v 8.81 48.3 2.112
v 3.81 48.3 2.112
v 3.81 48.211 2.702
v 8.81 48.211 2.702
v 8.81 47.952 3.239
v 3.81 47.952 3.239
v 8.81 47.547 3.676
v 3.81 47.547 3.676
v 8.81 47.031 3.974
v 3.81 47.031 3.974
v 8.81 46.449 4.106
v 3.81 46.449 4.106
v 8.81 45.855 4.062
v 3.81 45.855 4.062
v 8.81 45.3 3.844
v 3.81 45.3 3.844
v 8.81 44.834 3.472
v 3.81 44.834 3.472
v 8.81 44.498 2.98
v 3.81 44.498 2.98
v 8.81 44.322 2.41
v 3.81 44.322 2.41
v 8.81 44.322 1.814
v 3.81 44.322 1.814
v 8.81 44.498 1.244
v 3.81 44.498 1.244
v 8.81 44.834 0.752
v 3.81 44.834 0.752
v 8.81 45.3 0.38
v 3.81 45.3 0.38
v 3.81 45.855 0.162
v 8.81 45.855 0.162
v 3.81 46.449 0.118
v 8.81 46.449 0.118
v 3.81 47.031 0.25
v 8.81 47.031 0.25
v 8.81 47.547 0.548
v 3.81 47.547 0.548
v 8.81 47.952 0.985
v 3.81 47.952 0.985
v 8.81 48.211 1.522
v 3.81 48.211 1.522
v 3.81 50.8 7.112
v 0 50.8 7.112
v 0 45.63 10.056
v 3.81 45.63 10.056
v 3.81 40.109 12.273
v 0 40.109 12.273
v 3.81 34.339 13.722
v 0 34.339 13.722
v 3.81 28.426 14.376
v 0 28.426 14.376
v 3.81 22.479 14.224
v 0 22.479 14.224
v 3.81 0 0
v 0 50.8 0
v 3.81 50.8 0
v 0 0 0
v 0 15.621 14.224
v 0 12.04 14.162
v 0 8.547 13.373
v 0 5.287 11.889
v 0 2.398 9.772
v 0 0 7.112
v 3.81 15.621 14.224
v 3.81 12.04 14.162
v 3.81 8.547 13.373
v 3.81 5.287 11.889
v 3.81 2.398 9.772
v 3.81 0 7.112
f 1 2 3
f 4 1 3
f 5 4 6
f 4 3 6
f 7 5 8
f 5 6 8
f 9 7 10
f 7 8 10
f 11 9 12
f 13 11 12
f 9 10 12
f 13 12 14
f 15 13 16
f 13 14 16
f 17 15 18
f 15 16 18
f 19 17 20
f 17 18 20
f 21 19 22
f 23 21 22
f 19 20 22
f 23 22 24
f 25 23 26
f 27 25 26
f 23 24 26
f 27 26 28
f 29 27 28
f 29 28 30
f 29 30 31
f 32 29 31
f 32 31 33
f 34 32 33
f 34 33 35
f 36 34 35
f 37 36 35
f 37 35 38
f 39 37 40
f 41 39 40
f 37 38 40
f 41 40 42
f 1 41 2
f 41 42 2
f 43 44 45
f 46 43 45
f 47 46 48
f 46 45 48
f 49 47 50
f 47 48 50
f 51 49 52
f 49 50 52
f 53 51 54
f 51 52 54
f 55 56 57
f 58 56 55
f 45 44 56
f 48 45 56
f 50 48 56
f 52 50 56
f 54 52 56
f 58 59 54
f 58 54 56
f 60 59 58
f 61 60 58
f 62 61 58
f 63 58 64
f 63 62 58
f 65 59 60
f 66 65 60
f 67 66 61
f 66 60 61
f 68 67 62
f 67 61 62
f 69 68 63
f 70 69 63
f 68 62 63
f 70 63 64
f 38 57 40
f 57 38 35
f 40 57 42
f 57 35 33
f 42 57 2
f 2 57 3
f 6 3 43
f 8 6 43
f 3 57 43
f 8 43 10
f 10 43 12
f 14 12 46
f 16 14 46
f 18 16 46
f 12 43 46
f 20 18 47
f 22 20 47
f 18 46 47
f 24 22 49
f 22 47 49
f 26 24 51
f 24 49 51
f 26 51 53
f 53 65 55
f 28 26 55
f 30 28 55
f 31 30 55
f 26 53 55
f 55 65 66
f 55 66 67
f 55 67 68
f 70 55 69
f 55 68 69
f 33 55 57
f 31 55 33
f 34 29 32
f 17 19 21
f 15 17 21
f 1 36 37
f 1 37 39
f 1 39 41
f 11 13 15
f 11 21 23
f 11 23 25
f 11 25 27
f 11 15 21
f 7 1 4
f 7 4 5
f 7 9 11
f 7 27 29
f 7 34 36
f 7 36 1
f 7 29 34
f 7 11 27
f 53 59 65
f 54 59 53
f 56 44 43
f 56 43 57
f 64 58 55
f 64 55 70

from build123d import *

# Parameters (mm, degrees)
PAD_DEPTH    = 3.81
SKETCH001_R  = 2
PAD001_DEPTH = 5


with BuildPart() as part:
    # Sketch → Pad (new body)
    with BuildSketch(Plane.YZ):
        with BuildLine():
            Line((50.8, 7.112), (50.8, 0))
            Line((50.8, 0), (0, 0))
            Line((0, 0), (0, 7.112))
            ThreePointArc((15.621017, 14.224002), (6.878912, 12.714188), (0, 7.112))
            Line((15.621017, 14.224002), (22.479017, 14.224002))
            ThreePointArc((50.8, 7.112), (37.249044, 13.095258), (22.479017, 14.224002))
        make_face()
    extrude(amount=PAD_DEPTH)

    # Sketch001 (on Face8 of Pad) → Pad001 (join)
    with BuildSketch(Plane.YZ.offset(3.81)):
        with Locations((46.3, 2.112)):
            Circle(SKETCH001_R)
    extrude(amount=PAD001_DEPTH)


solid = part.part
